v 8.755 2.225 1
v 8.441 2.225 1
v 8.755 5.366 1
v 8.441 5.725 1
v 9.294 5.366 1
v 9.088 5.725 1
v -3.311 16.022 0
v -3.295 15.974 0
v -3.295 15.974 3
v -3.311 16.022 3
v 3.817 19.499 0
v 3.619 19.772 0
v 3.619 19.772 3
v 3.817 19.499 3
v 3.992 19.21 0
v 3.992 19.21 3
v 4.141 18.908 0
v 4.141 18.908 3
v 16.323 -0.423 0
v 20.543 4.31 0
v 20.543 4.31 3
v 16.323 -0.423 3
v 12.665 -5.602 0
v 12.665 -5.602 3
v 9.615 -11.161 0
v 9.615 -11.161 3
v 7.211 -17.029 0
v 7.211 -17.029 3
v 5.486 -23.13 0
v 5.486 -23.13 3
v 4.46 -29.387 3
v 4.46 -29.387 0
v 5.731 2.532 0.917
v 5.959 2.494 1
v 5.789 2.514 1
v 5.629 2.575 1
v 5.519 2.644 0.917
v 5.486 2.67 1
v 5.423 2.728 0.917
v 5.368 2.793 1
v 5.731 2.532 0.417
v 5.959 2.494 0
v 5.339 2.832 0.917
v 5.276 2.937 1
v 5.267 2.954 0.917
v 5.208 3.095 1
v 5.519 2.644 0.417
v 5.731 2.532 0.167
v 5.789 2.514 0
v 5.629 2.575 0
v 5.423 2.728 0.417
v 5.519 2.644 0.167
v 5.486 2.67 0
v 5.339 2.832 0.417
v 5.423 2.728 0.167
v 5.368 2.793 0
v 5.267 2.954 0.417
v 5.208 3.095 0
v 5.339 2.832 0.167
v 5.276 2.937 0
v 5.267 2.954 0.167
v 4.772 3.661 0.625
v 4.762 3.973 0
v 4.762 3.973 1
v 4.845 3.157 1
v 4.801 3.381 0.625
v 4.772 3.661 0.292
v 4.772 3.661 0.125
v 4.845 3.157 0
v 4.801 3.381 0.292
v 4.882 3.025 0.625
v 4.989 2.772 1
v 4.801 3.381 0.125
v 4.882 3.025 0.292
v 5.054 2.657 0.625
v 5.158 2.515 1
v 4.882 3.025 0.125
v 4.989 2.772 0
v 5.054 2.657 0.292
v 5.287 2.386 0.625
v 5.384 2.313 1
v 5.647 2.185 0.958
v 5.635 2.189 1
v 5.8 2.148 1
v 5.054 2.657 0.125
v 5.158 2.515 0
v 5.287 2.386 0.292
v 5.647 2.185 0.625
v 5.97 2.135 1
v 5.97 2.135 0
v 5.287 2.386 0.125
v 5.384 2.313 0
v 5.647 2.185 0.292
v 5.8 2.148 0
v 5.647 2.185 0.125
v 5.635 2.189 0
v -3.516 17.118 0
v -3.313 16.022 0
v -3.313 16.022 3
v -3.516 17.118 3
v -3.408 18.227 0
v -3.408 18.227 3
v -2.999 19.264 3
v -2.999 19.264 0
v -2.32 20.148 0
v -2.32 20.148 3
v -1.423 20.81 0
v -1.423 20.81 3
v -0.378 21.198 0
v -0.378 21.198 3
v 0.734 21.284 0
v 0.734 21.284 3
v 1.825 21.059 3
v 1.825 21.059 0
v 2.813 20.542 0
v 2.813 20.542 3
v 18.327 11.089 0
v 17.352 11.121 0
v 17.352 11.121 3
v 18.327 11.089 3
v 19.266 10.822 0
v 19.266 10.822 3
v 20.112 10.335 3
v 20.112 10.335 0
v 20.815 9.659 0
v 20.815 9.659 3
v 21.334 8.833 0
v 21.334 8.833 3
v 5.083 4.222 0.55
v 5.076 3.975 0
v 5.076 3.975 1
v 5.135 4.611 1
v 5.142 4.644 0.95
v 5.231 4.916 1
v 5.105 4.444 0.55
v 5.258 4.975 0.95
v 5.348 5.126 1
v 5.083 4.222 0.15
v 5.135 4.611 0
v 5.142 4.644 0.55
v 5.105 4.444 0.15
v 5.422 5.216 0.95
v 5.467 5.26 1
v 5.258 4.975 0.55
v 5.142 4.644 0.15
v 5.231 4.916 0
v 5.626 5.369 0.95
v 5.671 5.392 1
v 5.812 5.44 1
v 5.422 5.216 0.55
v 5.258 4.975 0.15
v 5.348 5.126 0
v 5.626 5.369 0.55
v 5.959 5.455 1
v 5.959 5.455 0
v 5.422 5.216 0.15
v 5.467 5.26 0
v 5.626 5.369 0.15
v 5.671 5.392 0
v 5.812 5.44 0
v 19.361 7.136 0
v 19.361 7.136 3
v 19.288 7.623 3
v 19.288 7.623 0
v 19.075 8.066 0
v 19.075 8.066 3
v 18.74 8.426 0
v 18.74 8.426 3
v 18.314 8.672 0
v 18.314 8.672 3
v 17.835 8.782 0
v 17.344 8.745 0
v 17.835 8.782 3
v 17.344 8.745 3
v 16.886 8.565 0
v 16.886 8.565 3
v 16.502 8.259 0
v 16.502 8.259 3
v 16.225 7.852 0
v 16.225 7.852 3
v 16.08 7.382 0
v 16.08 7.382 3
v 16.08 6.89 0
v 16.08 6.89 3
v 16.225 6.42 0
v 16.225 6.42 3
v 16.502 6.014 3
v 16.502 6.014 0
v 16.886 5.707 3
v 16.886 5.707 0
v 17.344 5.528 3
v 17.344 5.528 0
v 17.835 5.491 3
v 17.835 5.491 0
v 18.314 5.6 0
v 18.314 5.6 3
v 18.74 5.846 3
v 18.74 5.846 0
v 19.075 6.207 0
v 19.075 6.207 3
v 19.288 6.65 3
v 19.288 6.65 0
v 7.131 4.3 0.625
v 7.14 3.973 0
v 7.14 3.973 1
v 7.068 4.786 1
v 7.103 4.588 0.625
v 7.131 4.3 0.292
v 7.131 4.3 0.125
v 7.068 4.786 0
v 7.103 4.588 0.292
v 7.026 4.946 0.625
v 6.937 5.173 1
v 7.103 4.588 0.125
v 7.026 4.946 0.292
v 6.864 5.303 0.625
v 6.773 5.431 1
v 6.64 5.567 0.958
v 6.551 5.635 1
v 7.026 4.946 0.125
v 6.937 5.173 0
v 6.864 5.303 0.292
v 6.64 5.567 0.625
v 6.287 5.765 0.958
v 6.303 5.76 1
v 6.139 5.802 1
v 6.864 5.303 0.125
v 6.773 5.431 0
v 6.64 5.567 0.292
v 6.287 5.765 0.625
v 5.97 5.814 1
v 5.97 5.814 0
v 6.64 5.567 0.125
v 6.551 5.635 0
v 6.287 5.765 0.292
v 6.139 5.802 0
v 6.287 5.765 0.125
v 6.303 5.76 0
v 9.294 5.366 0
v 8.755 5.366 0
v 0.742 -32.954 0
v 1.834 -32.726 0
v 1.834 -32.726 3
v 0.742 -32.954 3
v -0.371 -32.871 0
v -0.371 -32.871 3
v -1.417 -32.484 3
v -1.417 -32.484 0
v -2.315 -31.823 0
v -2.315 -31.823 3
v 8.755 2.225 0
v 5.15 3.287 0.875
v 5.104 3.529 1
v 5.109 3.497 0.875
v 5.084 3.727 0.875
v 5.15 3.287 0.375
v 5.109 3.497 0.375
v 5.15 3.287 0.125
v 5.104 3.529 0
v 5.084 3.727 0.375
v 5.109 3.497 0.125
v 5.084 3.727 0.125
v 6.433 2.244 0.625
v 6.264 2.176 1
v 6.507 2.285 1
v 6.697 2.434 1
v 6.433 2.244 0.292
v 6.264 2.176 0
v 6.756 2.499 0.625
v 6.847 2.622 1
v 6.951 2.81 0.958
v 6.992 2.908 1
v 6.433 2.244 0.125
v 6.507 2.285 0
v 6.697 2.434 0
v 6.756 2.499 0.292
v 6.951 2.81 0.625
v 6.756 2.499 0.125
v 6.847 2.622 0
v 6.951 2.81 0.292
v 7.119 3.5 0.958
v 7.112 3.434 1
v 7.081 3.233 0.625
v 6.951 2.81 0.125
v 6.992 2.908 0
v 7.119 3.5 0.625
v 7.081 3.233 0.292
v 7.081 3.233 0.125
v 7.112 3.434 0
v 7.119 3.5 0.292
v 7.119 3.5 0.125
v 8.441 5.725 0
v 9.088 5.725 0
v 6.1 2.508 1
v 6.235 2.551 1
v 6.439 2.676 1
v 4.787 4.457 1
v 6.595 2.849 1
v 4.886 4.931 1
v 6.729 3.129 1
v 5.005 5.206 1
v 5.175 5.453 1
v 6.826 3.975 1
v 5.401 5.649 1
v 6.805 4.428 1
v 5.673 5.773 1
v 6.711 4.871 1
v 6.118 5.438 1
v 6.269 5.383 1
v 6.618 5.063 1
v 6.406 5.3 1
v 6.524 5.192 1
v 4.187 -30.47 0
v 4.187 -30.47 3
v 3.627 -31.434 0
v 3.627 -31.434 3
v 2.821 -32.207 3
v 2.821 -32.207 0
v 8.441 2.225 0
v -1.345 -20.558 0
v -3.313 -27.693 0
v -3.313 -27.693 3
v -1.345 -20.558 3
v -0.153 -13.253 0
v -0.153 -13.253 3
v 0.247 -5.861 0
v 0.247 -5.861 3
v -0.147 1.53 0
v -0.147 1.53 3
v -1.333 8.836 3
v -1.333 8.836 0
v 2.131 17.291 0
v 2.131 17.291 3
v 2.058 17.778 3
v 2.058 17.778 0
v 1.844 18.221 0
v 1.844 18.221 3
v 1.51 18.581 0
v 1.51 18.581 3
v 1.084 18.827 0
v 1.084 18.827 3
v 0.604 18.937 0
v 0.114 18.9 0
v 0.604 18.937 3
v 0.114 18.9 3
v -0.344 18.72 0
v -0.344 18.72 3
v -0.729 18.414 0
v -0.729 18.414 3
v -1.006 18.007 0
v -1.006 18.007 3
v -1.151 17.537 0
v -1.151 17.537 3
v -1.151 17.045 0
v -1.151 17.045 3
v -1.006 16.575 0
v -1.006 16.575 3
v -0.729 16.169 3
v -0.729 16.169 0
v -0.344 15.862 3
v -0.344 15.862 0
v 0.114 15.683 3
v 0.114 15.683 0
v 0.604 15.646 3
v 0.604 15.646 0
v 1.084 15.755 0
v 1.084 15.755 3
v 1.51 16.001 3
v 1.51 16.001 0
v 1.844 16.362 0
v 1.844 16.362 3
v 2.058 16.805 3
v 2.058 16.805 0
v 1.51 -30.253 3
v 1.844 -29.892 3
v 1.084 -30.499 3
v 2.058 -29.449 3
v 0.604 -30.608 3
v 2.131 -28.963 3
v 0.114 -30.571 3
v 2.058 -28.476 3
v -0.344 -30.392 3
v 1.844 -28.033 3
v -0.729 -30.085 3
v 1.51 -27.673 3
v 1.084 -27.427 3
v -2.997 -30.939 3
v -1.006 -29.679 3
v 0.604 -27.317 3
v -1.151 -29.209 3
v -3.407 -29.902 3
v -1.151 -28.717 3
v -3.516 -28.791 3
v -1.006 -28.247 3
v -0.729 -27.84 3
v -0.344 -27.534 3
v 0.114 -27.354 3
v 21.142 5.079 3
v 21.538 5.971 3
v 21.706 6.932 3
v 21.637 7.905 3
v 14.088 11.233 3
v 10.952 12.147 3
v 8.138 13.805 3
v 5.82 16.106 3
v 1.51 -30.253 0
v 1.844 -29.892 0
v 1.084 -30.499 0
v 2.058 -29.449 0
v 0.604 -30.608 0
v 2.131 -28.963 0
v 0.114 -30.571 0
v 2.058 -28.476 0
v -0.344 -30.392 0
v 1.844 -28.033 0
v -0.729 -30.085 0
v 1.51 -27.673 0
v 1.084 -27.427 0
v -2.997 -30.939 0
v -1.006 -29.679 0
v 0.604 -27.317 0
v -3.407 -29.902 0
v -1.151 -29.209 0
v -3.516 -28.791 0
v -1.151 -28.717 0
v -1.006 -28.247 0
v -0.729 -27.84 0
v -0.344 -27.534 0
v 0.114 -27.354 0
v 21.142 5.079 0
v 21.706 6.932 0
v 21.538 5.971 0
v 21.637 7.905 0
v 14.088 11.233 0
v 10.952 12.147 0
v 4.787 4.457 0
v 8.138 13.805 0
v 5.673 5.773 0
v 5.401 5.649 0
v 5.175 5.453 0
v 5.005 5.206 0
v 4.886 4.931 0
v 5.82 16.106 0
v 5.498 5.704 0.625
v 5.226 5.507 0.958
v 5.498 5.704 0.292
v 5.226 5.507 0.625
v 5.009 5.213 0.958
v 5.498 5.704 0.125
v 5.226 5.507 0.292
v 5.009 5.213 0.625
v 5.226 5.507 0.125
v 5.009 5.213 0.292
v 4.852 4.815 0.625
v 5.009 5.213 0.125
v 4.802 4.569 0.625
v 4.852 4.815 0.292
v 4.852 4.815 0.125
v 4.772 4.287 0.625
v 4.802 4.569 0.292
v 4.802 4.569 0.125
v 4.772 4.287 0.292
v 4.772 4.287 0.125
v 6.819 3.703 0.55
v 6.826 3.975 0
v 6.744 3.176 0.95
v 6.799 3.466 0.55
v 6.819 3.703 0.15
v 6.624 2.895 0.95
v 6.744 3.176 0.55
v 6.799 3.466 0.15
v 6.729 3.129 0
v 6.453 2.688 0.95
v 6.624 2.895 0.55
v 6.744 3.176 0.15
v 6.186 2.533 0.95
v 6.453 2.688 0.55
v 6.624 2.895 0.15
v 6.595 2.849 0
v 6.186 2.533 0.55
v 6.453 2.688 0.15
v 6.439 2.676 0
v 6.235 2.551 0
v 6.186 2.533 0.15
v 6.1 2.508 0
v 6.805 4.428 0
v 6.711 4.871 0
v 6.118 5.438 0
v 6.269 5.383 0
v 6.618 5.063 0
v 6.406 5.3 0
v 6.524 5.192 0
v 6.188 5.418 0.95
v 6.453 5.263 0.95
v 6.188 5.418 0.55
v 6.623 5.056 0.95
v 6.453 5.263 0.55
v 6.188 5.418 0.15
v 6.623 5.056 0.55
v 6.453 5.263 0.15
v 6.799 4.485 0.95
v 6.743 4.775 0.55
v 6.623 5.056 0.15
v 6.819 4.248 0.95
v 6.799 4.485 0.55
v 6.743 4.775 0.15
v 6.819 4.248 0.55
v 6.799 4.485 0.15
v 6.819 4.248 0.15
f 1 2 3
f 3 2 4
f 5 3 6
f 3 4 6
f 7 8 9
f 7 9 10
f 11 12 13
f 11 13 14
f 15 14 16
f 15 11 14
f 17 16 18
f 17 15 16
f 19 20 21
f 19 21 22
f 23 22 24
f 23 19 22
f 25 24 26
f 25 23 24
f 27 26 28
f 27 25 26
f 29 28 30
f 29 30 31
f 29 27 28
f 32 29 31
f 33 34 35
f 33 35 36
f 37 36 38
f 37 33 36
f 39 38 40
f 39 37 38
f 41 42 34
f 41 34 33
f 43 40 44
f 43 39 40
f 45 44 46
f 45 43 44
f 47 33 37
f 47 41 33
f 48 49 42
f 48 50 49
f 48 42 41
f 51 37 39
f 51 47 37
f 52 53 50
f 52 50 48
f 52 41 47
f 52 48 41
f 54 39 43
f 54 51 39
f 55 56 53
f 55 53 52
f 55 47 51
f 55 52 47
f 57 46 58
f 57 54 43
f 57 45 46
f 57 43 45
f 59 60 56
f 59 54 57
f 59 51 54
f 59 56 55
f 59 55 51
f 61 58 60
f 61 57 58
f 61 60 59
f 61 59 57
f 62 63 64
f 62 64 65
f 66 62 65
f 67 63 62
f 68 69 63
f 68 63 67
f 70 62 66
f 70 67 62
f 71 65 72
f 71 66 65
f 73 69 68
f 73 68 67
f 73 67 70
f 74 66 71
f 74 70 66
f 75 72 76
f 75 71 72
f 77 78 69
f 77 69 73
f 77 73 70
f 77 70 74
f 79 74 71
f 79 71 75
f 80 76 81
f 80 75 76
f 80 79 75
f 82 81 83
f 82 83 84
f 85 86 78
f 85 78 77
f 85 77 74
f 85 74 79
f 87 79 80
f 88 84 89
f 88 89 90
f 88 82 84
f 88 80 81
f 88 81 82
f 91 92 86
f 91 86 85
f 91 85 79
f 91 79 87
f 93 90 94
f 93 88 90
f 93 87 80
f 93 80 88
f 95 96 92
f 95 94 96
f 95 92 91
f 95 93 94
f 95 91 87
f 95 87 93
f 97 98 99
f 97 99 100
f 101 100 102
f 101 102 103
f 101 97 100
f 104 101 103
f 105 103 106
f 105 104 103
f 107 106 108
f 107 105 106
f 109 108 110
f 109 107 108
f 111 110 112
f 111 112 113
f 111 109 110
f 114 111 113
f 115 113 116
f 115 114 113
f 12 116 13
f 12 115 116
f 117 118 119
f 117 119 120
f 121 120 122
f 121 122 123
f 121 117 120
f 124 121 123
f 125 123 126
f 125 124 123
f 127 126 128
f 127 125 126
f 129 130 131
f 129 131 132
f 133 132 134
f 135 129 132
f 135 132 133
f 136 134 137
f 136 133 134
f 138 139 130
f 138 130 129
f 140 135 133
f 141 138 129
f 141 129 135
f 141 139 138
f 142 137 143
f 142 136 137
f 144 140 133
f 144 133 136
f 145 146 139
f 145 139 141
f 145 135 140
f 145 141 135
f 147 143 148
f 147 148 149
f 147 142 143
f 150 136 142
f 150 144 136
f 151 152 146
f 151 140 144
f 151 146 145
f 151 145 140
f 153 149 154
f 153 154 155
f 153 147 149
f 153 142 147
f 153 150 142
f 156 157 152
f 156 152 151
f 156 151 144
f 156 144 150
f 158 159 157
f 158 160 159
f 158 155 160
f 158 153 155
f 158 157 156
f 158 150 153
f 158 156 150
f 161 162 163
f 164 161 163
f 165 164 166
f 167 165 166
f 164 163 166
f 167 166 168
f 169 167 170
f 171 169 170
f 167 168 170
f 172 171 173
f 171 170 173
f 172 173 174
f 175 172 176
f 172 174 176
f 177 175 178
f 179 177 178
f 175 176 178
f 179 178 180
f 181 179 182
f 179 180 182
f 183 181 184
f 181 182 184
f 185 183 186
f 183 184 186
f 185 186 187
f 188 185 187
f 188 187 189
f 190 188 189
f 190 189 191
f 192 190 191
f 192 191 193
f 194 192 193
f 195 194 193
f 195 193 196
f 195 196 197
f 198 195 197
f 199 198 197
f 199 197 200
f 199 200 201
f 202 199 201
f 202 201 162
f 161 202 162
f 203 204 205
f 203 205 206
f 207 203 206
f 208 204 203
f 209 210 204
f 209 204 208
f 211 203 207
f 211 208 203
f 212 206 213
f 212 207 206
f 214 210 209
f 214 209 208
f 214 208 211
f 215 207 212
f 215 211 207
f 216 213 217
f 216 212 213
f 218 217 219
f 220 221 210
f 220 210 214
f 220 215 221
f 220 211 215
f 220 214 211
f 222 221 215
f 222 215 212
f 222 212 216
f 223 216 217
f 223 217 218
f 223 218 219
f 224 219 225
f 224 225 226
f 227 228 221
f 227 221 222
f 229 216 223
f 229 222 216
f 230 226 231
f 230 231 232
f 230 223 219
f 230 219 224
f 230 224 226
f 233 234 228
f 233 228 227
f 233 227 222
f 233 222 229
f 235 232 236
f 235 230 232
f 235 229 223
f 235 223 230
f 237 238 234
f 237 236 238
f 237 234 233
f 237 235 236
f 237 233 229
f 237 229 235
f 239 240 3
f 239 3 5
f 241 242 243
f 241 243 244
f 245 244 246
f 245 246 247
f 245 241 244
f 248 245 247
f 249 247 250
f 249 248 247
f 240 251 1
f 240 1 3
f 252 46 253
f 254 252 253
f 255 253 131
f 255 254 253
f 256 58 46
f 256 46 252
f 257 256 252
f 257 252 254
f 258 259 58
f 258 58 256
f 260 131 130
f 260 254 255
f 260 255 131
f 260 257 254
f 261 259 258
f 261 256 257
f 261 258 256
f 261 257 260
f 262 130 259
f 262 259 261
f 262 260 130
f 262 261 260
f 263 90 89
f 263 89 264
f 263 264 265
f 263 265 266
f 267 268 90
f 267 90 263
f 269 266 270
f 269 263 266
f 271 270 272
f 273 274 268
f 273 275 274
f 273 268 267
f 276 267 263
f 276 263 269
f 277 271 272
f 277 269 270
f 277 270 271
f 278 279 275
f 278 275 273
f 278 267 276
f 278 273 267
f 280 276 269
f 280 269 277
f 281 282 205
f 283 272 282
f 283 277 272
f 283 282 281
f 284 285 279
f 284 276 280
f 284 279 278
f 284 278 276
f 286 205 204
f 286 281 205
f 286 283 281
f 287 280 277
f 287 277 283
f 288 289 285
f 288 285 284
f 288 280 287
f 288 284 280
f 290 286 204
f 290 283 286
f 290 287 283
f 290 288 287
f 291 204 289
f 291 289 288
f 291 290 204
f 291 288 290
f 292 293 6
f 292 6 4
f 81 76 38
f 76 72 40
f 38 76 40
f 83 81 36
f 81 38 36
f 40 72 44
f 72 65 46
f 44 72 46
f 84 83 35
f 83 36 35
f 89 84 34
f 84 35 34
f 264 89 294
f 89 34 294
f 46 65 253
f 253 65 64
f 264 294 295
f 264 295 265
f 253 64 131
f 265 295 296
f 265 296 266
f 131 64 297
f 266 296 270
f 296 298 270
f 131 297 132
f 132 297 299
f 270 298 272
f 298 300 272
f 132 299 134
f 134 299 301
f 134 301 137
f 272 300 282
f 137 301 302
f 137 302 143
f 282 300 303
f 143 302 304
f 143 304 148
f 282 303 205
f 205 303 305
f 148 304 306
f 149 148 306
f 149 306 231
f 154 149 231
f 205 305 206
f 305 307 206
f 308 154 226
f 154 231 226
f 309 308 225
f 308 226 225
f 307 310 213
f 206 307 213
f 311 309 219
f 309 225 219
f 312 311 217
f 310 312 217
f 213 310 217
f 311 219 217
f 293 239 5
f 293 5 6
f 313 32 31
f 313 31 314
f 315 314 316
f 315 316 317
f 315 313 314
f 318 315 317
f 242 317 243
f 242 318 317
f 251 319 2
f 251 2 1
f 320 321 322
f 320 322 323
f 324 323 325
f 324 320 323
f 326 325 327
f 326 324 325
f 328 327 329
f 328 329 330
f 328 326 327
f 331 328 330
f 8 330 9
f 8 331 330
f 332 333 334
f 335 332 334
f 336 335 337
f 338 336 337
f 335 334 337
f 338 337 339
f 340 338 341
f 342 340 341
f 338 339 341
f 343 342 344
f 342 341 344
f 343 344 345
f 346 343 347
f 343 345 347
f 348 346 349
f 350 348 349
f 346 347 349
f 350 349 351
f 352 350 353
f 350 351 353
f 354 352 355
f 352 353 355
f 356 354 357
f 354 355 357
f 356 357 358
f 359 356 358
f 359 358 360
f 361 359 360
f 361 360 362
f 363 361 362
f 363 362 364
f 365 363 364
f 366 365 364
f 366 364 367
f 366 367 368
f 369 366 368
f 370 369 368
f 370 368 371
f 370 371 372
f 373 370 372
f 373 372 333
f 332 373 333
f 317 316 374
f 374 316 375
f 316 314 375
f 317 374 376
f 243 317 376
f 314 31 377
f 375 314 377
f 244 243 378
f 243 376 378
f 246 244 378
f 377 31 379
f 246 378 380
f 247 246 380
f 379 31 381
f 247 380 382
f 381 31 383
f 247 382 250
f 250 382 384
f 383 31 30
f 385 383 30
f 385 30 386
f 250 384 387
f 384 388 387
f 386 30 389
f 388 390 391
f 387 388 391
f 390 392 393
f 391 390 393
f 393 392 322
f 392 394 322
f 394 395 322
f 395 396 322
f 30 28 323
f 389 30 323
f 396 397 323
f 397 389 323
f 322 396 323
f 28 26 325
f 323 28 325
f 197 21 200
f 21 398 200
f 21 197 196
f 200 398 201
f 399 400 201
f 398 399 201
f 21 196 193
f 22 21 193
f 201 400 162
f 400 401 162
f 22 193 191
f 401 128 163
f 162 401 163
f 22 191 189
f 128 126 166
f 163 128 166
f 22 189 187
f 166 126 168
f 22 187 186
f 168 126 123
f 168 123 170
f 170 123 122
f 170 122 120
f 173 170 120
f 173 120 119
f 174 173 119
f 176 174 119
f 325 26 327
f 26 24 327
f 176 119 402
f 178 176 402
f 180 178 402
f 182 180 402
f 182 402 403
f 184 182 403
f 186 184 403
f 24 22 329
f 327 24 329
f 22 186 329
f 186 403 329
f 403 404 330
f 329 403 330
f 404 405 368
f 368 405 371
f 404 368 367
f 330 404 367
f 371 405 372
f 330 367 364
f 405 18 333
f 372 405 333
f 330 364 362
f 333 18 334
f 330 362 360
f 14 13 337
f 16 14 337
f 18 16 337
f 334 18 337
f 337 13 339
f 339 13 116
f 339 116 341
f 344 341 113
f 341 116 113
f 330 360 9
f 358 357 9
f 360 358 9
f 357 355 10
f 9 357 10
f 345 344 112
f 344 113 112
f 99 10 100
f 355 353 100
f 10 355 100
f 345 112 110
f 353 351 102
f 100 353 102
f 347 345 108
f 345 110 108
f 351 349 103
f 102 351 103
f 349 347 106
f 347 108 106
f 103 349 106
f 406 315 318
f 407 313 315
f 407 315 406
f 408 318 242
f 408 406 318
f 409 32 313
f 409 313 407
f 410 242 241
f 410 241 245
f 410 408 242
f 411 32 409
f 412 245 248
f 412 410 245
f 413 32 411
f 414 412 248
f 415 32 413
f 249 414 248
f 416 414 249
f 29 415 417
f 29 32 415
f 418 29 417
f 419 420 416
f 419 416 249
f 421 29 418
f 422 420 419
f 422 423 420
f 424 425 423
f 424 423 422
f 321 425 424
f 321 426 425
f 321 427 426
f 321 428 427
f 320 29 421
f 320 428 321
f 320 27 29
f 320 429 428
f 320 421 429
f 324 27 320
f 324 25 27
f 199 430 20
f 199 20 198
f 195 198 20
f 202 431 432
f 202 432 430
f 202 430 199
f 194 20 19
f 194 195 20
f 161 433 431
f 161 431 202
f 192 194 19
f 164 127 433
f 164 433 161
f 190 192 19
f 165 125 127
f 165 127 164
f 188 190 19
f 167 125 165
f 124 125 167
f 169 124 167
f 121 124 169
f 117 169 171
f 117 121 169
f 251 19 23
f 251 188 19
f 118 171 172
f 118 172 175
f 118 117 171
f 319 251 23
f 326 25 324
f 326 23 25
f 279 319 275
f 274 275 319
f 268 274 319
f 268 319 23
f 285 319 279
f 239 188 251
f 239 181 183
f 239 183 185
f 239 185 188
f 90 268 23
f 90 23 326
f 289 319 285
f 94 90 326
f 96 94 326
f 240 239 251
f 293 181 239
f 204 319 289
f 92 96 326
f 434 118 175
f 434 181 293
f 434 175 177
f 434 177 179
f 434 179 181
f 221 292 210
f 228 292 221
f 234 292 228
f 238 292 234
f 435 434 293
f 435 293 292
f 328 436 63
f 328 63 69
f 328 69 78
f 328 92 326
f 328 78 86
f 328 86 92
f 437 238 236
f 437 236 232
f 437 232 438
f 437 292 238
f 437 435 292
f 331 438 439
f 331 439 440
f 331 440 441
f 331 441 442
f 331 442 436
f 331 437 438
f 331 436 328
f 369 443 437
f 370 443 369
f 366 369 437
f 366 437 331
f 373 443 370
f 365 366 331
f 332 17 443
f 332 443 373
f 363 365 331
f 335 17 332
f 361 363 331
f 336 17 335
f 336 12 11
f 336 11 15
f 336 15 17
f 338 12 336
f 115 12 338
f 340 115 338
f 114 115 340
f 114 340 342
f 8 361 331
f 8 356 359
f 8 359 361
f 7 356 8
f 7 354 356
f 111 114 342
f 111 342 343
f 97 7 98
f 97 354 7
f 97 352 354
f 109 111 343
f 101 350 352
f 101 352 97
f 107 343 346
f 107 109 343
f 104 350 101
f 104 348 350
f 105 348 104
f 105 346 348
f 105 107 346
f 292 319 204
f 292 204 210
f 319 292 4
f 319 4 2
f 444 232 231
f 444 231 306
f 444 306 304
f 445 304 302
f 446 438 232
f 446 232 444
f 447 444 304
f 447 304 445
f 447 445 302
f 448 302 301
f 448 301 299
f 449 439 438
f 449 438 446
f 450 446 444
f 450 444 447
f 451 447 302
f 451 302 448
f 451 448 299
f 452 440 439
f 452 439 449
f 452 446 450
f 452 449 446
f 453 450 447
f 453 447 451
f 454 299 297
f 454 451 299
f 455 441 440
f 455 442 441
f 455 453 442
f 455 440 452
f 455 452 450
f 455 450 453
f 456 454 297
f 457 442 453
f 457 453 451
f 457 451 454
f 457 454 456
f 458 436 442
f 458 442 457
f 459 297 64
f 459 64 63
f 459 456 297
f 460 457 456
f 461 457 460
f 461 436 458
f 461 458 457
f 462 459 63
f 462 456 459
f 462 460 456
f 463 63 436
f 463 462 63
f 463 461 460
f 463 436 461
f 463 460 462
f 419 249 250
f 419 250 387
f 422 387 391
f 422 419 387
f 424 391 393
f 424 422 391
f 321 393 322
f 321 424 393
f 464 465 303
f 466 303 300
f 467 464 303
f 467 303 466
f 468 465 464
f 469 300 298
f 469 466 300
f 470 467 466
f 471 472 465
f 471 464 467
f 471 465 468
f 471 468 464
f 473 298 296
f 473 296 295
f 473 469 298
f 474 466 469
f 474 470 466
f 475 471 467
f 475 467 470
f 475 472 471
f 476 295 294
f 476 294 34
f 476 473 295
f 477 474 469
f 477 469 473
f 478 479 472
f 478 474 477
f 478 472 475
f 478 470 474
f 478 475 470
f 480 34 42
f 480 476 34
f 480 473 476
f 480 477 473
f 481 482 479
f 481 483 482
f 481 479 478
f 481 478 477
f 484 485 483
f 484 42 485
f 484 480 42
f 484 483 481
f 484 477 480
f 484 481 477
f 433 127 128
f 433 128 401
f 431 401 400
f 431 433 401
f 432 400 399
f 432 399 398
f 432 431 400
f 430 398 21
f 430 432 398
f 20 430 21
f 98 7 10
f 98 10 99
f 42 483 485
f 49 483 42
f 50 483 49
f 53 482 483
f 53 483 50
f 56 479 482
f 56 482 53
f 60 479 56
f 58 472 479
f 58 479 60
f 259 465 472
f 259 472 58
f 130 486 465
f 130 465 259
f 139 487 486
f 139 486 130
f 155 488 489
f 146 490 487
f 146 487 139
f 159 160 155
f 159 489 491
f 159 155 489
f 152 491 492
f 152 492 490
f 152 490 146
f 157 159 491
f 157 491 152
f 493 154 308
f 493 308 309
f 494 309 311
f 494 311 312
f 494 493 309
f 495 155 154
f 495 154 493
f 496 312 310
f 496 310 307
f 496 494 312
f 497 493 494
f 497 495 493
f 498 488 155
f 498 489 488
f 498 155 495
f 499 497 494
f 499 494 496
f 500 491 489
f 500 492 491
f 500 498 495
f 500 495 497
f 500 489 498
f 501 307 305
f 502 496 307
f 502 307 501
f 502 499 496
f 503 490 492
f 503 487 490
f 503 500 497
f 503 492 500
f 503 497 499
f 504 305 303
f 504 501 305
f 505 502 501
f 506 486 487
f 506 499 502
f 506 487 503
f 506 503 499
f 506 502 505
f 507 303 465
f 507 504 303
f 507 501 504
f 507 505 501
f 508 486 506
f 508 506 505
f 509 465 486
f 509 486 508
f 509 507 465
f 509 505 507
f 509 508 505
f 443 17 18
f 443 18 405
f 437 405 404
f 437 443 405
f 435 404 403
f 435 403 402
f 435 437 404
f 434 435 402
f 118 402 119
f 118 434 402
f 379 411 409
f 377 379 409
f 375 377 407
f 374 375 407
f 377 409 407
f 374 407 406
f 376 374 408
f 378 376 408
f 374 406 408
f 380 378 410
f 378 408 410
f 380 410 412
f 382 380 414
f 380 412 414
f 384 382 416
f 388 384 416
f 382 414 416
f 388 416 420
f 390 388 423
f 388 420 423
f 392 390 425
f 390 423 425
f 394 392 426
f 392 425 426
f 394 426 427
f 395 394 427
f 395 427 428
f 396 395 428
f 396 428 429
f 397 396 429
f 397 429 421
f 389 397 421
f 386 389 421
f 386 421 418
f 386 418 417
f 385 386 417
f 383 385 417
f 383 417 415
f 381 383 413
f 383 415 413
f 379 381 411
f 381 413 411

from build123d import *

# Parameters (mm, degrees)
SKETCH_1_R          = 1.35
SKETCH_1_R_2        = 1.65
SKETCH_1_R_3        = 1.3
EXTRUDE_1_DEPTH     = 3
SKETCH_2_R          = 1.65
CUT_EXTRUDE_1_DEPTH = 40.58429055
CUT_EXTRUDE_2_DEPTH = 1


with BuildPart() as part:
    # 草图1 → 凸台-拉伸1 (new body)
    with BuildSketch(Plane(origin=(0, 0, 0), x_dir=(-1, 0, 0), z_dir=(0, 0, -1))):
        with BuildLine():
            Line((3.311115848, 16.021732214), (3.313115848, 16.021732214))
            ThreePointArc((3.313115848, 16.021732214), (1.422584465, 20.809546819), (-3.619383376, 19.772320768))
            ThreePointArc((-3.619383376, 19.772320768), (-3.907451025, 19.356483629), (-4.140741668, 18.907619539))
            ThreePointArc((-4.140741668, 18.907619539), (-9.493299368, 12.888445888), (-17.351741668, 11.120619539))
            ThreePointArc((-17.351741668, 11.120619539), (-19.703460244, 10.604408599), (-21.333741668, 8.832619539))
            ThreePointArc((-21.333741668, 8.832619539), (-21.651545732, 6.446374123), (-20.542741668, 4.309619539))
            ThreePointArc((-20.542741668, 4.309619539), (-9.614805592, -11.161234041), (-4.459741668, -29.387380461))
            ThreePointArc((-4.459741668, -29.387380461), (-3.626617209, -31.434284825), (-1.833741668, -32.726380461))
            ThreePointArc((-1.833741668, -32.726380461), (0.370527809, -32.871130249), (2.315258332, -31.823380461))
            ThreePointArc((2.315258332, -31.823380461), (3.407459975, -29.901725556), (3.313258332, -27.693380461))
            ThreePointArc((3.313258332, -27.693380461), (-0.247316641, -5.861423686), (3.295002421, 15.973502613))
            Line((3.295002421, 15.973502613), (3.311115848, 16.021732214))
        make_face()
        with Locations(Location((-17.711384152, 7.136232214, 0), (0, 0, 180))):
            Circle(SKETCH_1_R, mode=Mode.SUBTRACT)
        with Locations(Location((-0.480884152, -28.962767786, 0), (0, 0, 180))):
            Circle(SKETCH_1_R_2, mode=Mode.SUBTRACT)
        with Locations(Location((-0.480884152, 17.291232214, 0), (0, 0, 180))):
            Circle(SKETCH_1_R_3, mode=Mode.SUBTRACT)
    extrude(amount=-EXTRUDE_1_DEPTH)

    # 草图2 → 切除-拉伸1 (cut, through all)
    with BuildSketch(Plane.XY.offset(3)):
        with Locations((0.480884152, 17.291232214)):
            Circle(SKETCH_2_R)
        with Locations((17.711384152, 7.136232214)):
            Circle(SKETCH_2_R)
    extrude(amount=-CUT_EXTRUDE_1_DEPTH, mode=Mode.SUBTRACT)

    # 草图3 → 切除-拉伸2 (cut)
    # profile 1 of 2: a face of its own
    with BuildSketch(Plane(origin=(0, 0, 0), x_dir=(-1, 0, 0), z_dir=(0, 0, -1))):
        Polygon((-9.088408768, 5.724720745), (-8.441273352, 5.724720745), (-8.441273352, 2.224720745), (-8.755375916, 2.224720745), (-8.755375916, 5.365746386), (-9.293837454, 5.365746386), align=None)
    # profile 2 of 2: a face of its own
    with BuildSketch(Plane(origin=(0, 0, 0), x_dir=(-1, 0, 0), z_dir=(0, 0, -1))):
        with BuildLine():
            add(Edge.make_bspline(
                [(-7.1399913, 3.973318501), (-7.139663282, 4.029415889), (-7.139026102, 4.138385873), (-7.131937681, 4.297170516), (-7.120162339, 4.446130805), (-7.104024966, 4.585273871), (-7.084386986, 4.714635635), (-7.058171499, 4.833870392), (-7.028358697, 4.943529999), (-6.993806251, 5.043972047), (-6.954818462, 5.13654975), (-6.912384201, 5.222974952), (-6.864819407, 5.303116884), (-6.814842494, 5.378254674), (-6.760430422, 5.447158369), (-6.703131632, 5.510801032), (-6.640709755, 5.567711782), (-6.575286747, 5.619558085), (-6.506270283, 5.665007556), (-6.435627617, 5.705040295), (-6.362872511, 5.739240162), (-6.287806328, 5.766130598), (-6.21110377, 5.788341445), (-6.132496703, 5.803530392), (-6.051855339, 5.813087301), (-5.997423905, 5.814000969), (-5.969819025, 5.814464335)],
                knots=[0, 0, 0, 0, 1.646270934, 3.197905019, 4.663502075, 6.030701355, 7.308322542, 8.50163776, 9.611534131, 10.641858119, 11.616356847, 12.558055219, 13.465016945, 14.349605745, 15.204443733, 16.039544428, 16.859896111, 17.680448484, 18.487036065, 19.28249412, 20.06191084, 20.843045899, 21.620316918, 22.403196591, 23.190181807, 24, 24, 24, 24], degree=3))
            add(Edge.make_bspline(
                [(-5.969819025, 5.814464335), (-5.941983546, 5.81397652), (-5.886627537, 5.813006409), (-5.804787162, 5.803682466), (-5.72483748, 5.788211343), (-5.647119342, 5.766290368), (-5.570994355, 5.739094692), (-5.497057948, 5.705007575), (-5.424850866, 5.665328707), (-5.355520578, 5.61870483), (-5.288305963, 5.566722554), (-5.224858, 5.507959885), (-5.165170914, 5.443010166), (-5.108495609, 5.372568302), (-5.056440012, 5.295283217), (-5.006866579, 5.212499107), (-4.962494544, 5.122768242), (-4.919759868, 5.027587775), (-4.882872882, 4.924324116), (-4.849606636, 4.813559355), (-4.822727668, 4.693985168), (-4.800338395, 4.566228923), (-4.782993499, 4.42982144), (-4.770360857, 4.285055124), (-4.763687772, 4.131834734), (-4.762431071, 4.027076885), (-4.761786172, 3.973318501)],
                knots=[0, 0, 0, 0, 0.810914788, 1.612654377, 2.396697861, 3.181598691, 3.963628158, 4.749916497, 5.551656086, 6.361998678, 7.18212741, 8.025565596, 8.878627764, 9.750805457, 10.657531673, 11.591944965, 12.560506719, 13.57287815, 14.630710178, 15.753379473, 16.941251878, 18.199788006, 19.531962791, 20.947069417, 22.433333509, 24, 24, 24, 24], degree=3))
            add(Edge.make_bspline(
                [(-4.761786172, 3.973318501), (-4.762437757, 3.919794594), (-4.763707343, 3.815505442), (-4.770286049, 3.662974466), (-4.783244681, 3.518976423), (-4.799454669, 3.383165961), (-4.821905632, 3.256108342), (-4.849510798, 3.137363893), (-4.880161121, 3.026419822), (-4.917995915, 2.92418501), (-4.959406625, 2.829233287), (-5.004461822, 2.740566139), (-5.052731648, 2.657399846), (-5.105320393, 2.580400099), (-5.161373806, 2.509021442), (-5.222091595, 2.444523819), (-5.28576218, 2.385353148), (-5.353174596, 2.33270152), (-5.423586147, 2.286616715), (-5.495545224, 2.245402865), (-5.570328607, 2.21217017), (-5.64624156, 2.183635129), (-5.724369926, 2.161834677), (-5.804616317, 2.146760822), (-5.886572553, 2.136188973), (-5.941974118, 2.135382493), (-5.969819025, 2.134977155)],
                knots=[0, 0, 0, 0, 1.561518951, 3.042555995, 4.452378317, 5.7783523, 7.031515105, 8.214008947, 9.334062868, 10.386615937, 11.391082383, 12.354592575, 13.286541444, 14.194233754, 15.072674879, 15.931287219, 16.775624067, 17.606195743, 18.42308326, 19.229000347, 20.022332153, 20.807536673, 21.593273796, 22.3848459, 23.188221202, 24, 24, 24, 24], degree=3))
            add(Edge.make_bspline(
                [(-5.969819025, 2.134977155), (-5.997423139, 2.135443511), (-6.051853064, 2.136363073), (-6.132505489, 2.145876804), (-6.210787932, 2.161172307), (-6.287086686, 2.182588911), (-6.361793202, 2.208803748), (-6.433889488, 2.242957431), (-6.504177172, 2.2822915), (-6.572468728, 2.327086922), (-6.637480889, 2.378408605), (-6.699579494, 2.435172894), (-6.757204513, 2.498796305), (-6.810838609, 2.568274228), (-6.861812697, 2.64296747), (-6.90870207, 2.723895843), (-6.952072925, 2.810738454), (-6.991716415, 2.904056365), (-7.026865079, 3.005211292), (-7.057912787, 3.115360471), (-7.082426944, 3.235476107), (-7.1034099, 3.364593474), (-7.120334283, 3.503267405), (-7.131888608, 3.651573183), (-7.139029923, 3.809418392), (-7.139664993, 3.917688166), (-7.1399913, 3.973318501)],
                knots=[0, 0, 0, 0, 0.810891512, 1.598919785, 2.382837074, 3.152667961, 3.926044502, 4.706494248, 5.493654104, 6.291793342, 7.103789334, 7.925228297, 8.761435821, 9.622817696, 10.50288917, 11.416980706, 12.369136599, 13.353924996, 14.394355917, 15.514179734, 16.714354668, 17.994756427, 19.357759367, 20.818452758, 22.365282078, 24, 24, 24, 24], degree=3))
        make_face()
        with BuildLine():
            add(Edge.make_bspline(
                [(-6.825888736, 3.974720745), (-6.825769289, 3.927972046), (-6.825537466, 3.837242001), (-6.819481265, 3.70539874), (-6.811231033, 3.582428412), (-6.800589736, 3.468174875), (-6.784786788, 3.363024863), (-6.76708, 3.26625518), (-6.74553191, 3.178377942), (-6.720036892, 3.098790132), (-6.690997795, 3.026141063), (-6.659291932, 2.958539848), (-6.625231209, 2.895187912), (-6.587112058, 2.836654303), (-6.545596995, 2.782748139), (-6.501623736, 2.732515307), (-6.453551152, 2.687718326), (-6.387047409, 2.633991471), (-6.299250935, 2.578472337), (-6.18863048, 2.530126247), (-6.074962029, 2.499743791), (-5.997810778, 2.495880035), (-5.959302198, 2.493951514)],
                knots=[0, 0, 0, 0, 1.459021318, 2.831673884, 4.118529203, 5.306027144, 6.411944654, 7.436330062, 8.375795394, 9.233974572, 10.042671642, 10.816086306, 11.563610507, 12.285937304, 12.993564865, 13.685989202, 14.367179055, 15.041617293, 16.353048772, 17.594441528, 18.799311195, 20, 20, 20, 20], degree=3))
            add(Edge.make_bspline(
                [(-5.959302198, 2.493951514), (-5.920544526, 2.495549295), (-5.843109203, 2.498741558), (-5.729975408, 2.529540295), (-5.620145138, 2.576009835), (-5.534073197, 2.63095734), (-5.468590654, 2.68328567), (-5.421673664, 2.727900318), (-5.378611615, 2.777856185), (-5.337769541, 2.831755481), (-5.300310465, 2.890627965), (-5.266247327, 2.954190541), (-5.23516398, 3.022619718), (-5.217454934, 3.070389458), (-5.208400756, 3.094812892)],
                knots=[0, 0, 0, 0, 1.353760809, 2.704726607, 4.075137775, 5.516104923, 6.260822281, 7.007110065, 7.778089737, 8.566572457, 9.372053459, 10.217411131, 11.088608312, 12, 12, 12, 12], degree=3))
            add(Edge.make_bspline(
                [(-5.208400756, 3.094812892), (-5.197848988, 3.126042632), (-5.176424374, 3.189452396), (-5.1488126, 3.287816048), (-5.1270672, 3.391018812), (-5.107503835, 3.498443929), (-5.094150779, 3.61088363), (-5.083402966, 3.727990014), (-5.077072279, 3.849851376), (-5.076287527, 3.932646367), (-5.075888736, 3.974720745)],
                knots=[0, 0, 0, 0, 0.884706709, 1.796334032, 2.740027952, 3.714592787, 4.726048262, 5.777819803, 6.87074269, 8, 8, 8, 8], degree=3))
            add(Edge.make_bspline(
                [(-5.075888736, 3.974720745), (-5.076438926, 4.016788318), (-5.077515213, 4.099081482), (-5.081629201, 4.219599663), (-5.092252775, 4.334067424), (-5.104051894, 4.442977897), (-5.121449115, 4.545728199), (-5.140206922, 4.643178505), (-5.165408135, 4.734121529), (-5.19232791, 4.819981111), (-5.223138305, 4.899781766), (-5.257054039, 4.973895552), (-5.293275798, 5.042680277), (-5.332618039, 5.105947218), (-5.374613722, 5.163979761), (-5.420371271, 5.215614356), (-5.468075644, 5.262451324), (-5.53489283, 5.315913893), (-5.622367119, 5.370425588), (-5.731212767, 5.420591348), (-5.844483411, 5.449399641), (-5.921056865, 5.453461328), (-5.959302198, 5.455489976)],
                knots=[0, 0, 0, 0, 1.31362396, 2.569729283, 3.763502607, 4.902122613, 5.988968491, 7.01645872, 7.998833611, 8.933434873, 9.825090667, 10.667526885, 11.477055099, 12.250526234, 12.991942729, 13.710640831, 14.402115721, 15.076753259, 16.378508321, 17.609869233, 18.806226677, 20, 20, 20, 20], degree=3))
            add(Edge.make_bspline(
                [(-5.959302198, 5.455489976), (-5.99801279, 5.453458529), (-6.075504496, 5.449391935), (-6.18995245, 5.420698681), (-6.299656802, 5.370685716), (-6.386899777, 5.315733343), (-6.453763563, 5.263395032), (-6.500846256, 5.218008578), (-6.544992429, 5.168362323), (-6.585660129, 5.113960408), (-6.623749412, 5.055495041), (-6.658730425, 4.992506276), (-6.690247754, 4.924674912), (-6.71933229, 4.852058477), (-6.744905078, 4.772477532), (-6.765999042, 4.684708539), (-6.785486095, 4.588246647), (-6.799281364, 4.482527139), (-6.811545119, 4.368244986), (-6.819426467, 4.244967667), (-6.825557725, 4.112903287), (-6.825776189, 4.021704128), (-6.825888736, 3.974720745)],
                knots=[0, 0, 0, 0, 1.207732386, 2.417664972, 3.655092373, 4.956220595, 5.625982001, 6.301752483, 6.994047911, 7.697131622, 8.419323945, 9.170223765, 9.943494443, 10.752040957, 11.610060368, 12.549350801, 13.567764191, 14.679664412, 15.874934091, 17.154273443, 18.533957287, 20, 20, 20, 20], degree=3))
        make_face(mode=Mode.SUBTRACT)
    extrude(amount=-CUT_EXTRUDE_2_DEPTH, mode=Mode.SUBTRACT)


solid = part.part
